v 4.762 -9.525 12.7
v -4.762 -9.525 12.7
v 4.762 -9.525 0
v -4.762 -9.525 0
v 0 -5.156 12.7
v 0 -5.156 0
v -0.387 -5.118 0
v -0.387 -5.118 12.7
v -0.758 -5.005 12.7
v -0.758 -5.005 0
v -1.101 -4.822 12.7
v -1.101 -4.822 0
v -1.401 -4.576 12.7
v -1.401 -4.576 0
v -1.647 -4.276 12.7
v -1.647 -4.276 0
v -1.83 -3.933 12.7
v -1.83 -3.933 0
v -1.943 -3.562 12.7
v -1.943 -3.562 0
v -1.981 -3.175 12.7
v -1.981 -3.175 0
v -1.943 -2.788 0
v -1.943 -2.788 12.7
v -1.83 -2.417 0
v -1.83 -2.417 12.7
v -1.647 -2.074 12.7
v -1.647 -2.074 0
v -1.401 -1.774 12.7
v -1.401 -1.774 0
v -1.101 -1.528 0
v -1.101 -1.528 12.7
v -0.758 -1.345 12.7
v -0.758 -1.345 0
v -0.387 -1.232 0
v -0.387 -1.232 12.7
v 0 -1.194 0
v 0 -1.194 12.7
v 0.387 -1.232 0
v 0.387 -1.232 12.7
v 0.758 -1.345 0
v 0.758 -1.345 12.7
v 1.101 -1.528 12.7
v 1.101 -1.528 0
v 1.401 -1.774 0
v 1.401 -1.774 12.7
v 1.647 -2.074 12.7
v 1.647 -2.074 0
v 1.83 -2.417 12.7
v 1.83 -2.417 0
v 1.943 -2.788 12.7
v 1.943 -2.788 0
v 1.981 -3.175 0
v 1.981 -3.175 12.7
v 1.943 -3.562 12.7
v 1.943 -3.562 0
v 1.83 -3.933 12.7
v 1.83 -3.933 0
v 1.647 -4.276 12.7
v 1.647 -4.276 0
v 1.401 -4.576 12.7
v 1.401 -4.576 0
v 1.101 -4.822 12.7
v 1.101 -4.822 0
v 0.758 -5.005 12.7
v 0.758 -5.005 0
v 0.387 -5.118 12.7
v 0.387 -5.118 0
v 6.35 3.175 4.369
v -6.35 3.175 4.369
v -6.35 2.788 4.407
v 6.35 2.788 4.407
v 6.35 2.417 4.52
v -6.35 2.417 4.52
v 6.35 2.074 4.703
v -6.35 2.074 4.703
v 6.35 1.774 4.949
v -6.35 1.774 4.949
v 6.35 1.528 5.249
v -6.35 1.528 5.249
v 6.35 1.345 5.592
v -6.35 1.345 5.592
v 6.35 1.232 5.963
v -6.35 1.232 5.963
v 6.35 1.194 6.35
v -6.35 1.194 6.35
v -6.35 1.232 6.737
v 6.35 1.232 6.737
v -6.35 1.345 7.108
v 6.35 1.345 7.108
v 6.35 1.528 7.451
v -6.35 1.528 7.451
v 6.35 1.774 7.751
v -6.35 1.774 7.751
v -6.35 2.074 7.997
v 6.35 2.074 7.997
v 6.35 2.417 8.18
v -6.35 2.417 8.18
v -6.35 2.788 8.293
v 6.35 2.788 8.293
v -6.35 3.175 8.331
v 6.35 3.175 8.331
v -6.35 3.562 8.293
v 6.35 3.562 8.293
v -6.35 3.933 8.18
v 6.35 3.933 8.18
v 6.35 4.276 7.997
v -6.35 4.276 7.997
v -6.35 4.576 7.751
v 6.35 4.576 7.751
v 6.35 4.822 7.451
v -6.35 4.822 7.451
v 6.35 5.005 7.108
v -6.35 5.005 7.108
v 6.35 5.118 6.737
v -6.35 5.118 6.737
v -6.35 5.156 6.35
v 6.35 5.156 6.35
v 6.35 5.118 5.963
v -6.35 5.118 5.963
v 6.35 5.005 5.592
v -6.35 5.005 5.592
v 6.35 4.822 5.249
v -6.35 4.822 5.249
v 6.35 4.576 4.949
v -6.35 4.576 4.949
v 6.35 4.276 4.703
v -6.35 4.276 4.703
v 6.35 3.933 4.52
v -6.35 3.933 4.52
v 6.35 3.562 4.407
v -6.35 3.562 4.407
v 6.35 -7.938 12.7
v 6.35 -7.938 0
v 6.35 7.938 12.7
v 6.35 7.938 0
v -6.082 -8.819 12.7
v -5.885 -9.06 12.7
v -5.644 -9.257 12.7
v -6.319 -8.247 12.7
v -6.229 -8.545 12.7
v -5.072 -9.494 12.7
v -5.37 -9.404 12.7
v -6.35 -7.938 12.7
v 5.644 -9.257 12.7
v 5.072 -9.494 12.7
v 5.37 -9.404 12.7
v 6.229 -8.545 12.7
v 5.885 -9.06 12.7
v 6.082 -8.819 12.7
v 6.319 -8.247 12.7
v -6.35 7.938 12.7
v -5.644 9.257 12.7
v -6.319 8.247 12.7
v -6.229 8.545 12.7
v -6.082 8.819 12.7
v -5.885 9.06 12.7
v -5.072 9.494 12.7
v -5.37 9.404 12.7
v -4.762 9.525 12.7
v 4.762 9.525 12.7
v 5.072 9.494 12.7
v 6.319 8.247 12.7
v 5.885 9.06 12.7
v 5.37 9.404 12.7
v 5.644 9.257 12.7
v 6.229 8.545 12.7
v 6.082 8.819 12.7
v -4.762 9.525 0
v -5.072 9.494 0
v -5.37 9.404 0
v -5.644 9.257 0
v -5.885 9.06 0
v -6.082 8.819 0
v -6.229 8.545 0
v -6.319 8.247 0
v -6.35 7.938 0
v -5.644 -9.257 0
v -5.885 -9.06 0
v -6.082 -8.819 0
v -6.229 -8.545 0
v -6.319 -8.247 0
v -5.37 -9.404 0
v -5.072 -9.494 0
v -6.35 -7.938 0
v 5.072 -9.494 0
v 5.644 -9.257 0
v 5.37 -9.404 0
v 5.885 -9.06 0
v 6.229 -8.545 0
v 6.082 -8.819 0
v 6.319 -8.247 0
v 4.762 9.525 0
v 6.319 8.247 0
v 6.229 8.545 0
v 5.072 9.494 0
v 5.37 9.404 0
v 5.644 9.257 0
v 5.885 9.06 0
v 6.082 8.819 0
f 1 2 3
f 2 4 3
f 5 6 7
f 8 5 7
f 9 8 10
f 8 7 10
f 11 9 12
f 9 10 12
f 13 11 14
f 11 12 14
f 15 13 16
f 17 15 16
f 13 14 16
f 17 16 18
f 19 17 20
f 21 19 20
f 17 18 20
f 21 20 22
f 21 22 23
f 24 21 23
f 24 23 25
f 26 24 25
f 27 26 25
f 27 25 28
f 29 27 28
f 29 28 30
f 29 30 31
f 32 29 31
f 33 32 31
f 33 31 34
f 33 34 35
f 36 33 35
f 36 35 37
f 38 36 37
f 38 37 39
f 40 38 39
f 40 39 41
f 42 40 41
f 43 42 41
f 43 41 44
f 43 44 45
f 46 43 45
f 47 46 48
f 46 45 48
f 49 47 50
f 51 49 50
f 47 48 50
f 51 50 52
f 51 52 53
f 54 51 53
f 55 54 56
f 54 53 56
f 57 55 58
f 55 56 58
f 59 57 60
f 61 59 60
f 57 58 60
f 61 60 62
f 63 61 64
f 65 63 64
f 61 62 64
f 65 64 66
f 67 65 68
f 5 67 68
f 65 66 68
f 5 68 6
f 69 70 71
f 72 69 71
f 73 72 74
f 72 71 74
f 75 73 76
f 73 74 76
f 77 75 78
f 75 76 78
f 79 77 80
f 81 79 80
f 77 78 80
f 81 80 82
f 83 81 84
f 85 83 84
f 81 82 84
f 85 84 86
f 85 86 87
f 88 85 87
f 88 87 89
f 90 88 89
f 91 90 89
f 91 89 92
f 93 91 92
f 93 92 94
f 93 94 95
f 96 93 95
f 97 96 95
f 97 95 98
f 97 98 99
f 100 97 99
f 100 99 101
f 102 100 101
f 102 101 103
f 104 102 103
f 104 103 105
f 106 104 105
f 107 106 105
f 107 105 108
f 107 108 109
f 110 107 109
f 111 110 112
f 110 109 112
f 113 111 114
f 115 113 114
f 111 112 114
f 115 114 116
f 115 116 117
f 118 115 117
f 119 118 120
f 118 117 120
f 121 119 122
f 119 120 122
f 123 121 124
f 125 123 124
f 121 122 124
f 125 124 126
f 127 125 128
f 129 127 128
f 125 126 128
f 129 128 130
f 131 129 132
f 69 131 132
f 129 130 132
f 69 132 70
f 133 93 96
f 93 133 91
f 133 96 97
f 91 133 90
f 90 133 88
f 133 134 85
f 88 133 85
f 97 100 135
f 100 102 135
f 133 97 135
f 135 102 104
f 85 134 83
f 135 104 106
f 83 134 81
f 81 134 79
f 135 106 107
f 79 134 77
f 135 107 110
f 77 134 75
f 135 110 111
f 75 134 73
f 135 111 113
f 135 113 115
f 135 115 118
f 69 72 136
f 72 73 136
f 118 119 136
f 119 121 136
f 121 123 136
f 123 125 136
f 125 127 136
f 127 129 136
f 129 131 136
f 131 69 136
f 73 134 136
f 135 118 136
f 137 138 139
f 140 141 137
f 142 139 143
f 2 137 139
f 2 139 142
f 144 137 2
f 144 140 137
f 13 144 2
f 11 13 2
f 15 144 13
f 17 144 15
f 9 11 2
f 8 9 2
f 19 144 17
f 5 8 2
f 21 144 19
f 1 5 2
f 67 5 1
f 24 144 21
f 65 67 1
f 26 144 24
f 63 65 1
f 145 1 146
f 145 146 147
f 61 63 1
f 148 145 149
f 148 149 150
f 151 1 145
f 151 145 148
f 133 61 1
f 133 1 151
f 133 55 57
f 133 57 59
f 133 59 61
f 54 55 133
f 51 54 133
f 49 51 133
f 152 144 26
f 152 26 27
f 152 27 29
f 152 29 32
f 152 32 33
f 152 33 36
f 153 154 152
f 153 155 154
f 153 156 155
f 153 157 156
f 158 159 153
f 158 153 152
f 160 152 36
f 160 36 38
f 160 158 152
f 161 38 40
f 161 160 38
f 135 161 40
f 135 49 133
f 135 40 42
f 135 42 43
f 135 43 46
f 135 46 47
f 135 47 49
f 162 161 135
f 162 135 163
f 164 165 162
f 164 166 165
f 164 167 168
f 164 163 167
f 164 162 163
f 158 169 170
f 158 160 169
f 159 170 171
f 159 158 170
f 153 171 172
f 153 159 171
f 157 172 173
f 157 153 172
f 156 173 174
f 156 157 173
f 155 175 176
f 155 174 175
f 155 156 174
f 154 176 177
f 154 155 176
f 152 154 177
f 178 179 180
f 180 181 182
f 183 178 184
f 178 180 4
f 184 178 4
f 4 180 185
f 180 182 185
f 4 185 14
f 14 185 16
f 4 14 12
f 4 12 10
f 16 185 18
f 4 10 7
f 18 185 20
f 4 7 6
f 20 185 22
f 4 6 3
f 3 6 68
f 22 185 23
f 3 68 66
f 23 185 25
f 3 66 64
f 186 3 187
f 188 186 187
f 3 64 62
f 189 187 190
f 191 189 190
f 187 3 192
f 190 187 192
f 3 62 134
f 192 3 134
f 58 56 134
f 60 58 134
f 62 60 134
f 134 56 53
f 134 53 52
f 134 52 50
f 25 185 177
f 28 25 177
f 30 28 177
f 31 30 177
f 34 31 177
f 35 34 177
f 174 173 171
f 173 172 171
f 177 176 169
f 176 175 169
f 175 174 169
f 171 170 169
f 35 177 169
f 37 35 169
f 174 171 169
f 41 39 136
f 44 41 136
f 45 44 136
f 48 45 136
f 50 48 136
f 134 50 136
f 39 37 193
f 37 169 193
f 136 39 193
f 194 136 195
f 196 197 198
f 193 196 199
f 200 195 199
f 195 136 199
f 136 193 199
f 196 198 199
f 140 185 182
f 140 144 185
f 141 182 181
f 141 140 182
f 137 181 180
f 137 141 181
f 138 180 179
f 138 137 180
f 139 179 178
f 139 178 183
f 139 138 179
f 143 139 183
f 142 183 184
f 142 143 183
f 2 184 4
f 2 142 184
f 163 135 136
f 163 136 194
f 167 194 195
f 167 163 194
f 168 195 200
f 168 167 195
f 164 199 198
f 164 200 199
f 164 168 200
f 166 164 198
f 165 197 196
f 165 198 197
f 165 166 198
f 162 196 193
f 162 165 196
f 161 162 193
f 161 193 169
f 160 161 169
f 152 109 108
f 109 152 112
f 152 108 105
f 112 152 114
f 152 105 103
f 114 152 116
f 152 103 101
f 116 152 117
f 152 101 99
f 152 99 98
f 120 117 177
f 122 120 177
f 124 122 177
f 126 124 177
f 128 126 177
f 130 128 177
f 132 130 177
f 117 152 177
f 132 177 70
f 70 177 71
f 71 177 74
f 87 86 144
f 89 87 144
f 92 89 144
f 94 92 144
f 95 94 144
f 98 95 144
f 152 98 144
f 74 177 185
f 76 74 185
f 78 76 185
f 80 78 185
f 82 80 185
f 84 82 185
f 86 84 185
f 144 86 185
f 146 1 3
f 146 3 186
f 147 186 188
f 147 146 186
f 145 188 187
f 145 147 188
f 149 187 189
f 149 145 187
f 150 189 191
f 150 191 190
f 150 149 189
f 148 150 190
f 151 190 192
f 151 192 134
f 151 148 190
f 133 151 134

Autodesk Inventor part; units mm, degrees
ref_plane "YZ Plane" through (0, 0, 0) normal (1, 0, 0) x (0, 1, 0)
ref_plane "XZ Plane" through (0, 0, 0) normal (0, 1, 0) x (-1, 0, 0)
ref_plane "XY Plane" through (0, 0, 0) normal (0, 0, 1) x (1, 0, 0)
sketch "Sketch1" plane through (0, 0, 0) normal (0, 0, 1) x (1, 0, 0)
  line L0 (-6.35, -9.525) -> (6.35, -9.525)
  line L1 (6.35, -9.525) -> (6.35, 9.525)
  line L2 (6.35, 9.525) -> (-6.35, 9.525)
  line L3 (-6.35, 9.525) -> (-6.35, -9.525)
  line L4 (-6.35, -9.525) -> (6.35, 9.525) construction
  line L5 (6.35, -9.525) -> (-6.35, 9.525) construction
  point P0 (0, 0)
  dimension "d0" = 12.7
  dimension "d1" = 19.05
extrude "Plate1" add sketch "Sketch1" along normal blind 12.7
sketch "Sketch2" plane through (6.35, -9.525, 0) normal (1, 0, 0) x (0, 0, -1)
  line L0 (0, 19.05) -> (-12.7, 19.05) projected
  line L1 (0, 0) -> (0, 19.05) projected
  point P0 (0, 9.525)
  point P1 (-6.35, 12.7)
  dimension "d3" = 6.35
  dimension "d4" = 6.35
hole "Hole1" at (6.35, 3.175, 6.35) direction (-1, 0, 0) diameter 3.9624 depth 12.7 tip angle 118 thread size "10-32 UNF" class "2B" standard "ANSI Unified Screw Threads"
sketch "Sketch3" plane through (0, 0, 12.7) normal (0, 0, 1) x (1, 0, 0)
  line L0 (6.35, -9.525) -> (-6.35, -9.525) projected
  point P0 (0, 0)
  point P1 (0, -3.175)
  dimension "d12" = 6.35
hole "Hole2" at (0, -3.175, 12.7) direction (0, 0, -1) diameter 3.9624 depth 12.7 tip angle 118 thread size "10-32 UNF" class "2B" standard "ANSI Unified Screw Threads"
fillet "Corner Round1" radius 1.5875 4 edges at (6.35, -9.525, 6.35) (-6.35, 9.525, 6.35) (6.35, 9.525, 6.35) (-6.35, -9.525, 6.35)
equation "\"d10\" = Thickness"
equation "\"d18\" = Thickness"
equation "\"d2\" = Thickness"
equation "\"BendRadius\" = Thickness"
equation "\"BendReliefWidth\" = Thickness"
equation "\"BendReliefDepth\" = 0.5 * Thickness"
equation "\"CornerReliefSize\" = 4 * Thickness"
equation "\"MinimumRemnant\" = 2 * Thickness"
equation "\"TransitionRadius\" = BendRadius"
equation "\"JacobiRadiusSize\" = BendRadius"
equation "\"GapSize\" = Thickness"
equation "\"Thickness\" = 12.7"
properties part number "PLATE,NUT-BLOCK,1-LONG" material "Aluminum 6061"
